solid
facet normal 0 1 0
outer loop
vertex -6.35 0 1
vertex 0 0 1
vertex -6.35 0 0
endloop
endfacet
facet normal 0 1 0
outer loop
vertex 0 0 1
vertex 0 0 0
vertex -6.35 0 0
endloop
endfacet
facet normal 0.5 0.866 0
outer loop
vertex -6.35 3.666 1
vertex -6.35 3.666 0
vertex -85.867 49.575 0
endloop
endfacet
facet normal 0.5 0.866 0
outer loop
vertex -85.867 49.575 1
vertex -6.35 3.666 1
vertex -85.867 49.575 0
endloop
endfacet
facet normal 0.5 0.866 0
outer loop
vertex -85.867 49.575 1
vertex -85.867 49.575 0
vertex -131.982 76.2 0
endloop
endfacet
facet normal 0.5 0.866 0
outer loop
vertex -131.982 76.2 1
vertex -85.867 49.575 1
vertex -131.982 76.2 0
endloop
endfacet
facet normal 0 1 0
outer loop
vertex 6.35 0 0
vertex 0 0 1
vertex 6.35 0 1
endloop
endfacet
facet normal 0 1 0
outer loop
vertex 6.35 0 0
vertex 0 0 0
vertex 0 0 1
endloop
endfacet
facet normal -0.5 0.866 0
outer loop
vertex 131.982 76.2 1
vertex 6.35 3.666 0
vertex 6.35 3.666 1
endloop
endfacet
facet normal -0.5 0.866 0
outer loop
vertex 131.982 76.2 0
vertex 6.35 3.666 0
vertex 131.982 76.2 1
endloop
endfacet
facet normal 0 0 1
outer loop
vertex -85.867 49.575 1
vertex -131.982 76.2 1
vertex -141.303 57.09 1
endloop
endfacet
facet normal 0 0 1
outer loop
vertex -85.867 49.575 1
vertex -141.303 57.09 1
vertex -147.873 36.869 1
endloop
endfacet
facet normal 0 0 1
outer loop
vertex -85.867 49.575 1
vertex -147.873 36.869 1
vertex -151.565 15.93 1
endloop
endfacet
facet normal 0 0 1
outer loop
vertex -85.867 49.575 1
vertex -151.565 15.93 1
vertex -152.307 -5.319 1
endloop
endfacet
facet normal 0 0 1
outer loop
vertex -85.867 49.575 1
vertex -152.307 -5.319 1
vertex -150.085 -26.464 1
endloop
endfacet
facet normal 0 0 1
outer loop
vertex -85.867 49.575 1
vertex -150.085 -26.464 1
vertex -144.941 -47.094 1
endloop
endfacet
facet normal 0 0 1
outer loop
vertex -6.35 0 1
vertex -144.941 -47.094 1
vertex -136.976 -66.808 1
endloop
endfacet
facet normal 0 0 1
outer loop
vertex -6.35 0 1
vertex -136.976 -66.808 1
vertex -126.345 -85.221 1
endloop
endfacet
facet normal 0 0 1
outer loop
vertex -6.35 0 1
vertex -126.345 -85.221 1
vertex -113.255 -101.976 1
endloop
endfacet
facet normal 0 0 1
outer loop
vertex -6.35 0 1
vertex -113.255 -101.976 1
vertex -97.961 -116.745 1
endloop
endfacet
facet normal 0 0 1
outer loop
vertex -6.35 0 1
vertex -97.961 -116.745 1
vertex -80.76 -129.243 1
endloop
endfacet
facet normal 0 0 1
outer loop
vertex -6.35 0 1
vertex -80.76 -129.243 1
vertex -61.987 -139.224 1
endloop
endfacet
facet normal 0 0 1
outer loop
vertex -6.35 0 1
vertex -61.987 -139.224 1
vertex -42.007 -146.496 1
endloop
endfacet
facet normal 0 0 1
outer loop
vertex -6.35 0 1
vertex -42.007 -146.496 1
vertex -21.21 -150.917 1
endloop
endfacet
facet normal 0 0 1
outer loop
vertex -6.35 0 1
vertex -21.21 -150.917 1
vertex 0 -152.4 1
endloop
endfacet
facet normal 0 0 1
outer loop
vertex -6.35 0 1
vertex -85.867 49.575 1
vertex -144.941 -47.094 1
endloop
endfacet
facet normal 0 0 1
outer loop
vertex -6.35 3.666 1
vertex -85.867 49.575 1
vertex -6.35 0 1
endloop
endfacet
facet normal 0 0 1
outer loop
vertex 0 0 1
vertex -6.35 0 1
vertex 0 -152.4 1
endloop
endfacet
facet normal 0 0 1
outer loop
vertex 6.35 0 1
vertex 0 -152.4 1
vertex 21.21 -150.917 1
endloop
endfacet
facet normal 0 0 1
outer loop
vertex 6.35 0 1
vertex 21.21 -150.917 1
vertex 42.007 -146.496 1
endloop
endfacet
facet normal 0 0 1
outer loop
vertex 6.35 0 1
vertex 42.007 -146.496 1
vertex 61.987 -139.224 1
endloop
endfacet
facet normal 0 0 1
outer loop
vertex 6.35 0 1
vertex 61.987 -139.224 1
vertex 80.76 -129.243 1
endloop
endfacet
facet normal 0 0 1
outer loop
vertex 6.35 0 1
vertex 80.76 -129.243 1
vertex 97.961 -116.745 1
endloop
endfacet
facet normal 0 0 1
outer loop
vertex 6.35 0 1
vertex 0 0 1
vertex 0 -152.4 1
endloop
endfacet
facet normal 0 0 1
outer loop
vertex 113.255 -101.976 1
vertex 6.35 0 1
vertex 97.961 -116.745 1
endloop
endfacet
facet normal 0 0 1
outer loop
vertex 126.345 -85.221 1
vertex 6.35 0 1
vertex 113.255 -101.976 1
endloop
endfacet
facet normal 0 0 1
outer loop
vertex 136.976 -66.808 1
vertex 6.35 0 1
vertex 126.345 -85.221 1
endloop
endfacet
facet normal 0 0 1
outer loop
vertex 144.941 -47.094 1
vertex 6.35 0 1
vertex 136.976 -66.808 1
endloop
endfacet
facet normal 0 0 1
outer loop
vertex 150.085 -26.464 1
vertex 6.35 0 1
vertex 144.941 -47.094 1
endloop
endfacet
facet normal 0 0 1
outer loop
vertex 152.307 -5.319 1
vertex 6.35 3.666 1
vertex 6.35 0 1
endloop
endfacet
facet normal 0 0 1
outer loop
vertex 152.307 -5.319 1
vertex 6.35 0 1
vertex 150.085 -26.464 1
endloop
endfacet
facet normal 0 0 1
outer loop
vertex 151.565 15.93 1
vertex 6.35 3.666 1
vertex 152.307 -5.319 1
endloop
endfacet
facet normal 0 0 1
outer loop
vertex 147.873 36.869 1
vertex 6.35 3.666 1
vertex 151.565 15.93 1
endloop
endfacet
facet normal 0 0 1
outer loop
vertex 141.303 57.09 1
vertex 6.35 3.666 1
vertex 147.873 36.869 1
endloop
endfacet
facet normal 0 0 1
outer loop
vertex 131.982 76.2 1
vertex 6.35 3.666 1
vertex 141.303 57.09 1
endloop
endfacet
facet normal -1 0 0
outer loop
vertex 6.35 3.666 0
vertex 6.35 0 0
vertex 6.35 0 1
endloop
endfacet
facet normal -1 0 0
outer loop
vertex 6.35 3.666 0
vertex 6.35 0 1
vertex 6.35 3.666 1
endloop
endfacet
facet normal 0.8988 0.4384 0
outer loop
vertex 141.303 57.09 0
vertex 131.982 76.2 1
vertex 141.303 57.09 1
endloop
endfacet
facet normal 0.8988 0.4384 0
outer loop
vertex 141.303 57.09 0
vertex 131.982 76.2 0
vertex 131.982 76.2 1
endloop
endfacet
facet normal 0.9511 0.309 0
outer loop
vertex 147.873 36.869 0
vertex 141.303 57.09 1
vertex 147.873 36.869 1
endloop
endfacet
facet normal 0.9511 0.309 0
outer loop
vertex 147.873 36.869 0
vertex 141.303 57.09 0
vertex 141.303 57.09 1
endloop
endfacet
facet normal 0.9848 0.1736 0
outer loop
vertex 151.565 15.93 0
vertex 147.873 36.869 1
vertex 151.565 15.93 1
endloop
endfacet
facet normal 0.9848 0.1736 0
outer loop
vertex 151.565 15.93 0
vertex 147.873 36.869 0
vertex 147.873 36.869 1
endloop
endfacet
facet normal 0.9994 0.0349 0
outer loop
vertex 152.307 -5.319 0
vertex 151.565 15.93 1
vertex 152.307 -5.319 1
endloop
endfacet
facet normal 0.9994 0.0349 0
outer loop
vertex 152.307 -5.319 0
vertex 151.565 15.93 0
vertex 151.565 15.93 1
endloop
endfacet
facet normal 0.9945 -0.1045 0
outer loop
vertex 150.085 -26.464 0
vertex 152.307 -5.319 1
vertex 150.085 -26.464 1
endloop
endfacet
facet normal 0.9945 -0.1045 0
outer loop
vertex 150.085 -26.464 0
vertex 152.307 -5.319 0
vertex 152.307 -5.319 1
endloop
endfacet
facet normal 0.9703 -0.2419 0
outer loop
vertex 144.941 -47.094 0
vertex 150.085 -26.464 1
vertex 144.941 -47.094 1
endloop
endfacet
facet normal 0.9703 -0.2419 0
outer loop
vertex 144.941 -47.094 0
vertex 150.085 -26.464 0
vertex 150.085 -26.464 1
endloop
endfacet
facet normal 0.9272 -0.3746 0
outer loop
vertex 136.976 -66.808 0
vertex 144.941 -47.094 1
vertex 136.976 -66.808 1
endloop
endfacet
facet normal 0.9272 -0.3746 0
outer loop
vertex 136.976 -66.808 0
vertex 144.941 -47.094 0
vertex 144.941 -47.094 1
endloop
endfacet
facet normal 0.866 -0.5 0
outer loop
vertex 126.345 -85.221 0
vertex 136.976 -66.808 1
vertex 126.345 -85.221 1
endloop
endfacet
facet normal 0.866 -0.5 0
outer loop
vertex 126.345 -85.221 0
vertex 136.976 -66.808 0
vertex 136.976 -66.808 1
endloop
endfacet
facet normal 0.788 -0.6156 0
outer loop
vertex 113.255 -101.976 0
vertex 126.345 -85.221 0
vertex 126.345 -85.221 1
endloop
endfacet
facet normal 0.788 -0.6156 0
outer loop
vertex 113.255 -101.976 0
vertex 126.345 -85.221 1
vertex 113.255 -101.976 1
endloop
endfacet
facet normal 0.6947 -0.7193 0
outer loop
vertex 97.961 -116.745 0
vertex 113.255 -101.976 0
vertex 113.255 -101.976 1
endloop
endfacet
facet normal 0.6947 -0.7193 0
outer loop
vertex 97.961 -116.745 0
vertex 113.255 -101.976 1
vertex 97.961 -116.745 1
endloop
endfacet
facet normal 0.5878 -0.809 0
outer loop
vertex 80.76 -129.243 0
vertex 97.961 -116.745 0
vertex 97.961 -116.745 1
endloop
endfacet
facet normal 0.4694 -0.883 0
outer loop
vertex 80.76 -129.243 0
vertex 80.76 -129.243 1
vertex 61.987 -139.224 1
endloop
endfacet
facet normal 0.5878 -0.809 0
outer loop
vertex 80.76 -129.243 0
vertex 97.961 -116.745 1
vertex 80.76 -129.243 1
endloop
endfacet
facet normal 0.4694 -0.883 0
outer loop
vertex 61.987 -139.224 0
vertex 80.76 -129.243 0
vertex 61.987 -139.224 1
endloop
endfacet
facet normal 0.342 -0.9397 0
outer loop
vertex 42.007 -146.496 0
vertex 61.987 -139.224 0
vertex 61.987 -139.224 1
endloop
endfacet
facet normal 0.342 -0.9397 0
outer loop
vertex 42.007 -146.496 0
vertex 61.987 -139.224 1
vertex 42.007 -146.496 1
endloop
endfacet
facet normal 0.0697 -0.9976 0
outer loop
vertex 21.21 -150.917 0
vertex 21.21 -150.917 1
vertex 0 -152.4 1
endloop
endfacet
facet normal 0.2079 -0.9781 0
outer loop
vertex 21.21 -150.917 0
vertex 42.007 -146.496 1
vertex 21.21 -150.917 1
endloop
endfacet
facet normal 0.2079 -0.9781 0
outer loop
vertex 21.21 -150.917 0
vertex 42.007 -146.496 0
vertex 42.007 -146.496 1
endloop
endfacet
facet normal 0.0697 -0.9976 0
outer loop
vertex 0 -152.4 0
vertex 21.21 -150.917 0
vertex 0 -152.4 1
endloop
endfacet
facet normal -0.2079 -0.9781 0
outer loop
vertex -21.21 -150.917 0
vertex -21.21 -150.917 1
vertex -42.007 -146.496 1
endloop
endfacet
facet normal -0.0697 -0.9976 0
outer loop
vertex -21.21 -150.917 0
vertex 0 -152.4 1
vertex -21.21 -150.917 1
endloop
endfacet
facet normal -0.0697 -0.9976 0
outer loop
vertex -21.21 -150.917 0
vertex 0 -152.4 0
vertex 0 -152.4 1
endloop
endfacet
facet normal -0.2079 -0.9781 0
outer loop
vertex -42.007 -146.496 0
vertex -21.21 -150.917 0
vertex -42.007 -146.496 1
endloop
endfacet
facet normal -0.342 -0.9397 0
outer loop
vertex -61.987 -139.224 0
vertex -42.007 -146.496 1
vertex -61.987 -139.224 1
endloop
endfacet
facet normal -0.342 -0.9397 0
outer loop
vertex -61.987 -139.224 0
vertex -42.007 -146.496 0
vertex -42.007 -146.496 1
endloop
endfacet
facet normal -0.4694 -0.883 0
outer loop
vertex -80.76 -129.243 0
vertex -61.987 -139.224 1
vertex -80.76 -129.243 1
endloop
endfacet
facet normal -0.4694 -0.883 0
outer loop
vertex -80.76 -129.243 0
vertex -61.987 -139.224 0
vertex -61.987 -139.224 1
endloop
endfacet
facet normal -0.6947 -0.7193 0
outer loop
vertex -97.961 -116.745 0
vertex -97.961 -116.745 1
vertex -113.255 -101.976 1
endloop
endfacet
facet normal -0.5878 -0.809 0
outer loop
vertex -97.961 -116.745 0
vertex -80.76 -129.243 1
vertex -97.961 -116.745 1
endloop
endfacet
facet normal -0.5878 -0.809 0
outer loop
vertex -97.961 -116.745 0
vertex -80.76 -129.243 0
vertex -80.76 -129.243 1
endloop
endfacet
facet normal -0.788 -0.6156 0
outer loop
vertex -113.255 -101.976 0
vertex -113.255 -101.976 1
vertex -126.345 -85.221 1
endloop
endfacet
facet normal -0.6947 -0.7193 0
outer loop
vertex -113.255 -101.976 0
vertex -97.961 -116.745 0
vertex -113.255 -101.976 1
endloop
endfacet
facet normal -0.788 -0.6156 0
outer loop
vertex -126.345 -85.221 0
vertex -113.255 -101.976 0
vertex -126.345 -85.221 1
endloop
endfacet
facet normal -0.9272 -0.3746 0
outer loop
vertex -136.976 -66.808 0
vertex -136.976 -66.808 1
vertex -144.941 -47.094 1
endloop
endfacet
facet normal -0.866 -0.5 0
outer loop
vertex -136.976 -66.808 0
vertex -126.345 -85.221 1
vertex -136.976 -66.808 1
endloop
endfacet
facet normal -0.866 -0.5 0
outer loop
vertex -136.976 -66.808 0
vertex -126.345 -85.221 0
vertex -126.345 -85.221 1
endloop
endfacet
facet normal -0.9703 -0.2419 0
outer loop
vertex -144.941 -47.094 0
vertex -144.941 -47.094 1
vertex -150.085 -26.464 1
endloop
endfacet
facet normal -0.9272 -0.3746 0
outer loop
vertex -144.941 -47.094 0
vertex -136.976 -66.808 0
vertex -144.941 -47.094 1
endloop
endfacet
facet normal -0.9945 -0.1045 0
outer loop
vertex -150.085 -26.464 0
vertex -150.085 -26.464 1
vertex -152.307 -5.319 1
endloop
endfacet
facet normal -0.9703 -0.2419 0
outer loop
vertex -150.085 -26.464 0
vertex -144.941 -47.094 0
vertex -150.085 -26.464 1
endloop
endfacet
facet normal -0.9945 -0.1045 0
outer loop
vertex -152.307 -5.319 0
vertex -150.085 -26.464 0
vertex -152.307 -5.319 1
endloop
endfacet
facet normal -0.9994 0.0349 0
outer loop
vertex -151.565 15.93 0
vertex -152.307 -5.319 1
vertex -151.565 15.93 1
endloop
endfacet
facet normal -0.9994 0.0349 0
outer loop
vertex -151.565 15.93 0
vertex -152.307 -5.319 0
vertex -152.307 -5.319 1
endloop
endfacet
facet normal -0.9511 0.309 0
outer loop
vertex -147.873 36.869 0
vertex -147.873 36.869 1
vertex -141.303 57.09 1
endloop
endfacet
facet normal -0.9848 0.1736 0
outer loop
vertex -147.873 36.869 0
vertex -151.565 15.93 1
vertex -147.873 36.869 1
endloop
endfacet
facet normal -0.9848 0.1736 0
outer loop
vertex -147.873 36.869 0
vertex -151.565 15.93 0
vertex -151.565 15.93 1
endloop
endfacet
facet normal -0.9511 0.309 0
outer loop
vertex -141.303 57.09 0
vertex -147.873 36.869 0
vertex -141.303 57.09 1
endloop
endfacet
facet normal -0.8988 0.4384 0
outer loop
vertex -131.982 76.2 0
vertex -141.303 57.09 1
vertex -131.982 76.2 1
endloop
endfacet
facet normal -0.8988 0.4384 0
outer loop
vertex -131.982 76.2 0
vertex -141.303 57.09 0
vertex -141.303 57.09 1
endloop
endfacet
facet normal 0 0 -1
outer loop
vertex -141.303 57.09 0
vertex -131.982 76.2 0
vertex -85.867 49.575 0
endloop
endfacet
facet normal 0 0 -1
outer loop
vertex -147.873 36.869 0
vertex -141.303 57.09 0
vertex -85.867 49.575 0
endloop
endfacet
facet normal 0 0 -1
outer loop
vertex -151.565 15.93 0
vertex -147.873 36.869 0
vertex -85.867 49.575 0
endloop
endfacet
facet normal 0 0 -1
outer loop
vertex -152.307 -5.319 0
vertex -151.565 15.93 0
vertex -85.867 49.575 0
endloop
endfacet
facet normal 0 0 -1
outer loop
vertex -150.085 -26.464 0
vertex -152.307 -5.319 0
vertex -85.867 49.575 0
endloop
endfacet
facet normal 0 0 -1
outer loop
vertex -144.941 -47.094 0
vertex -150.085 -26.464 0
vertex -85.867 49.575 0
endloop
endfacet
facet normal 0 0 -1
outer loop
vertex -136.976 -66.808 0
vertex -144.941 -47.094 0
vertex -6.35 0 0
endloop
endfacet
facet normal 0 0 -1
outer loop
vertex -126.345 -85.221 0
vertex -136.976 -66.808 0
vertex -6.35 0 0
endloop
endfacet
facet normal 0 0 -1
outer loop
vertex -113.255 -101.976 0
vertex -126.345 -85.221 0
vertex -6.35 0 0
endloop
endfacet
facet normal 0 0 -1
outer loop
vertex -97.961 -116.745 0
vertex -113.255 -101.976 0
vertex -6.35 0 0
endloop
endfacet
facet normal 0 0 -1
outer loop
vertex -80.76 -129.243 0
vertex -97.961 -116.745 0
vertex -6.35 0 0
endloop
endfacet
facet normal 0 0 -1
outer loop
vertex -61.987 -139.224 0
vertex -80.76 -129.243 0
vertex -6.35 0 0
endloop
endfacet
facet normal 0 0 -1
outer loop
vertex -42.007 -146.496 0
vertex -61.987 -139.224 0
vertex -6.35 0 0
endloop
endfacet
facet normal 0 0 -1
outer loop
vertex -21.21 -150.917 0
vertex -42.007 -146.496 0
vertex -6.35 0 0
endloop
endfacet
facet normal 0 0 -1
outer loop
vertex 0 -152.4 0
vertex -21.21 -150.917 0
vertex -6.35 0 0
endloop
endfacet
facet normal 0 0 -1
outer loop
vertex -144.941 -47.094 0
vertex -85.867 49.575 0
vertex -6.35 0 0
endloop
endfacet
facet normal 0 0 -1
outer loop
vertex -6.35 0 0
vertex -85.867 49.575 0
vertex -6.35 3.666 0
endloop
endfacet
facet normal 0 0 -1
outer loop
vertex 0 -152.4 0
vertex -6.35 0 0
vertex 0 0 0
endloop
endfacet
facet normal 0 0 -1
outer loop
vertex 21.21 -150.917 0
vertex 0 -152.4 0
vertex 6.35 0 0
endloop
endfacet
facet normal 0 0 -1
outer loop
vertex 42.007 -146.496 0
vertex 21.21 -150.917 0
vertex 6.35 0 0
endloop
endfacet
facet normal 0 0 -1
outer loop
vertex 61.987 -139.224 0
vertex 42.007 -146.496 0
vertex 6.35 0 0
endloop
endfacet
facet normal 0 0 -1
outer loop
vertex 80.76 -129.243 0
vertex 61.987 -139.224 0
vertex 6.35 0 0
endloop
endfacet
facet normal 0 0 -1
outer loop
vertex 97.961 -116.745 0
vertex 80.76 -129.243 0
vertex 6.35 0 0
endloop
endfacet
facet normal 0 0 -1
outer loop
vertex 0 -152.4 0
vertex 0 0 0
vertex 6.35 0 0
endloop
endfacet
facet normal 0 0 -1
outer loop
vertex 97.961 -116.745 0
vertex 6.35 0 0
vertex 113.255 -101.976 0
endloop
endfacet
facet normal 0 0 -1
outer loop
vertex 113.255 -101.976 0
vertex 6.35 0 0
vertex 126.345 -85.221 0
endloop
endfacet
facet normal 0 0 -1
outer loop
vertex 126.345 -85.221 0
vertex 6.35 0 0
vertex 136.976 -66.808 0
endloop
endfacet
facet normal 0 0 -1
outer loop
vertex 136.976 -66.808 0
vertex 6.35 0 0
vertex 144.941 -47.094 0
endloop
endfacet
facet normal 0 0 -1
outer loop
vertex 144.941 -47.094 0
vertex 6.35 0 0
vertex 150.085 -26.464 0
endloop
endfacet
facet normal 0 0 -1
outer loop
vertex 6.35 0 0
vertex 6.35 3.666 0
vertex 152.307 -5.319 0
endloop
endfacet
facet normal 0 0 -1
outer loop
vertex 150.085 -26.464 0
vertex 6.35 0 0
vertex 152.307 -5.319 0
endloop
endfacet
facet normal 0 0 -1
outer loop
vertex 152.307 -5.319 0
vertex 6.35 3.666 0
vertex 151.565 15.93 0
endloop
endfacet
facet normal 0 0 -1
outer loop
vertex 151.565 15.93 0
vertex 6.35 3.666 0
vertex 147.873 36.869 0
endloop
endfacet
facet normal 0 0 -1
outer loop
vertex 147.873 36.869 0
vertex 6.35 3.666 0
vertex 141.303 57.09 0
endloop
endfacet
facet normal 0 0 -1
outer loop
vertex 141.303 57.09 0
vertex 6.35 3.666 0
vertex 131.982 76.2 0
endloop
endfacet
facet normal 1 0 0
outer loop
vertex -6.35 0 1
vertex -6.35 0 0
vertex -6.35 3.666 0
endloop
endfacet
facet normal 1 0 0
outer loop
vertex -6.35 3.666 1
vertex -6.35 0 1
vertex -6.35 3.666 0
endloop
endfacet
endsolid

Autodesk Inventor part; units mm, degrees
ref_plane "YZ Plane" through (0, 0, 0) normal (1, 0, 0) x (0, 1, 0)
ref_plane "XZ Plane" through (0, 0, 0) normal (0, 1, 0) x (-1, 0, 0)
ref_plane "XY Plane" through (0, 0, 0) normal (0, 0, 1) x (1, 0, 0)
sketch "Sketch1" plane through (0, 0, 0) normal (0, 0, 1) x (1, 0, 0)
  arc A0 (-131.9823, 76.2) -> (131.9823, 76.2) centre (0, 0) ccw
  line L0 (6.35, 3.6662) -> (131.9823, 76.2)
  line L1 (0, 0) -> (152.4, 0) construction
  line L2 (-6.35, 3.6662) -> (-85.8668, 49.5752)
  line L3 (0, 0) -> (99.1504, 0) construction
  line L4 (-85.8668, 49.5752) -> (-131.9823, 76.2)
  line L5 (0, 0) -> (6.35, 0)
  line L6 (6.35, 0) -> (6.35, 3.6662)
  line L7 (0, 0) -> (-6.35, 0)
  line L8 (-6.35, 0) -> (-6.35, 3.6662)
  dimension "d0" = 304.8
  dimension "d1" = 30
  dimension "d2" = 150
  dimension "d3" = 6.35
  dimension "d4" = 6.35
extrude "Extrusion1" add sketch "Sketch1" along normal blind 1
properties part number "view2"
